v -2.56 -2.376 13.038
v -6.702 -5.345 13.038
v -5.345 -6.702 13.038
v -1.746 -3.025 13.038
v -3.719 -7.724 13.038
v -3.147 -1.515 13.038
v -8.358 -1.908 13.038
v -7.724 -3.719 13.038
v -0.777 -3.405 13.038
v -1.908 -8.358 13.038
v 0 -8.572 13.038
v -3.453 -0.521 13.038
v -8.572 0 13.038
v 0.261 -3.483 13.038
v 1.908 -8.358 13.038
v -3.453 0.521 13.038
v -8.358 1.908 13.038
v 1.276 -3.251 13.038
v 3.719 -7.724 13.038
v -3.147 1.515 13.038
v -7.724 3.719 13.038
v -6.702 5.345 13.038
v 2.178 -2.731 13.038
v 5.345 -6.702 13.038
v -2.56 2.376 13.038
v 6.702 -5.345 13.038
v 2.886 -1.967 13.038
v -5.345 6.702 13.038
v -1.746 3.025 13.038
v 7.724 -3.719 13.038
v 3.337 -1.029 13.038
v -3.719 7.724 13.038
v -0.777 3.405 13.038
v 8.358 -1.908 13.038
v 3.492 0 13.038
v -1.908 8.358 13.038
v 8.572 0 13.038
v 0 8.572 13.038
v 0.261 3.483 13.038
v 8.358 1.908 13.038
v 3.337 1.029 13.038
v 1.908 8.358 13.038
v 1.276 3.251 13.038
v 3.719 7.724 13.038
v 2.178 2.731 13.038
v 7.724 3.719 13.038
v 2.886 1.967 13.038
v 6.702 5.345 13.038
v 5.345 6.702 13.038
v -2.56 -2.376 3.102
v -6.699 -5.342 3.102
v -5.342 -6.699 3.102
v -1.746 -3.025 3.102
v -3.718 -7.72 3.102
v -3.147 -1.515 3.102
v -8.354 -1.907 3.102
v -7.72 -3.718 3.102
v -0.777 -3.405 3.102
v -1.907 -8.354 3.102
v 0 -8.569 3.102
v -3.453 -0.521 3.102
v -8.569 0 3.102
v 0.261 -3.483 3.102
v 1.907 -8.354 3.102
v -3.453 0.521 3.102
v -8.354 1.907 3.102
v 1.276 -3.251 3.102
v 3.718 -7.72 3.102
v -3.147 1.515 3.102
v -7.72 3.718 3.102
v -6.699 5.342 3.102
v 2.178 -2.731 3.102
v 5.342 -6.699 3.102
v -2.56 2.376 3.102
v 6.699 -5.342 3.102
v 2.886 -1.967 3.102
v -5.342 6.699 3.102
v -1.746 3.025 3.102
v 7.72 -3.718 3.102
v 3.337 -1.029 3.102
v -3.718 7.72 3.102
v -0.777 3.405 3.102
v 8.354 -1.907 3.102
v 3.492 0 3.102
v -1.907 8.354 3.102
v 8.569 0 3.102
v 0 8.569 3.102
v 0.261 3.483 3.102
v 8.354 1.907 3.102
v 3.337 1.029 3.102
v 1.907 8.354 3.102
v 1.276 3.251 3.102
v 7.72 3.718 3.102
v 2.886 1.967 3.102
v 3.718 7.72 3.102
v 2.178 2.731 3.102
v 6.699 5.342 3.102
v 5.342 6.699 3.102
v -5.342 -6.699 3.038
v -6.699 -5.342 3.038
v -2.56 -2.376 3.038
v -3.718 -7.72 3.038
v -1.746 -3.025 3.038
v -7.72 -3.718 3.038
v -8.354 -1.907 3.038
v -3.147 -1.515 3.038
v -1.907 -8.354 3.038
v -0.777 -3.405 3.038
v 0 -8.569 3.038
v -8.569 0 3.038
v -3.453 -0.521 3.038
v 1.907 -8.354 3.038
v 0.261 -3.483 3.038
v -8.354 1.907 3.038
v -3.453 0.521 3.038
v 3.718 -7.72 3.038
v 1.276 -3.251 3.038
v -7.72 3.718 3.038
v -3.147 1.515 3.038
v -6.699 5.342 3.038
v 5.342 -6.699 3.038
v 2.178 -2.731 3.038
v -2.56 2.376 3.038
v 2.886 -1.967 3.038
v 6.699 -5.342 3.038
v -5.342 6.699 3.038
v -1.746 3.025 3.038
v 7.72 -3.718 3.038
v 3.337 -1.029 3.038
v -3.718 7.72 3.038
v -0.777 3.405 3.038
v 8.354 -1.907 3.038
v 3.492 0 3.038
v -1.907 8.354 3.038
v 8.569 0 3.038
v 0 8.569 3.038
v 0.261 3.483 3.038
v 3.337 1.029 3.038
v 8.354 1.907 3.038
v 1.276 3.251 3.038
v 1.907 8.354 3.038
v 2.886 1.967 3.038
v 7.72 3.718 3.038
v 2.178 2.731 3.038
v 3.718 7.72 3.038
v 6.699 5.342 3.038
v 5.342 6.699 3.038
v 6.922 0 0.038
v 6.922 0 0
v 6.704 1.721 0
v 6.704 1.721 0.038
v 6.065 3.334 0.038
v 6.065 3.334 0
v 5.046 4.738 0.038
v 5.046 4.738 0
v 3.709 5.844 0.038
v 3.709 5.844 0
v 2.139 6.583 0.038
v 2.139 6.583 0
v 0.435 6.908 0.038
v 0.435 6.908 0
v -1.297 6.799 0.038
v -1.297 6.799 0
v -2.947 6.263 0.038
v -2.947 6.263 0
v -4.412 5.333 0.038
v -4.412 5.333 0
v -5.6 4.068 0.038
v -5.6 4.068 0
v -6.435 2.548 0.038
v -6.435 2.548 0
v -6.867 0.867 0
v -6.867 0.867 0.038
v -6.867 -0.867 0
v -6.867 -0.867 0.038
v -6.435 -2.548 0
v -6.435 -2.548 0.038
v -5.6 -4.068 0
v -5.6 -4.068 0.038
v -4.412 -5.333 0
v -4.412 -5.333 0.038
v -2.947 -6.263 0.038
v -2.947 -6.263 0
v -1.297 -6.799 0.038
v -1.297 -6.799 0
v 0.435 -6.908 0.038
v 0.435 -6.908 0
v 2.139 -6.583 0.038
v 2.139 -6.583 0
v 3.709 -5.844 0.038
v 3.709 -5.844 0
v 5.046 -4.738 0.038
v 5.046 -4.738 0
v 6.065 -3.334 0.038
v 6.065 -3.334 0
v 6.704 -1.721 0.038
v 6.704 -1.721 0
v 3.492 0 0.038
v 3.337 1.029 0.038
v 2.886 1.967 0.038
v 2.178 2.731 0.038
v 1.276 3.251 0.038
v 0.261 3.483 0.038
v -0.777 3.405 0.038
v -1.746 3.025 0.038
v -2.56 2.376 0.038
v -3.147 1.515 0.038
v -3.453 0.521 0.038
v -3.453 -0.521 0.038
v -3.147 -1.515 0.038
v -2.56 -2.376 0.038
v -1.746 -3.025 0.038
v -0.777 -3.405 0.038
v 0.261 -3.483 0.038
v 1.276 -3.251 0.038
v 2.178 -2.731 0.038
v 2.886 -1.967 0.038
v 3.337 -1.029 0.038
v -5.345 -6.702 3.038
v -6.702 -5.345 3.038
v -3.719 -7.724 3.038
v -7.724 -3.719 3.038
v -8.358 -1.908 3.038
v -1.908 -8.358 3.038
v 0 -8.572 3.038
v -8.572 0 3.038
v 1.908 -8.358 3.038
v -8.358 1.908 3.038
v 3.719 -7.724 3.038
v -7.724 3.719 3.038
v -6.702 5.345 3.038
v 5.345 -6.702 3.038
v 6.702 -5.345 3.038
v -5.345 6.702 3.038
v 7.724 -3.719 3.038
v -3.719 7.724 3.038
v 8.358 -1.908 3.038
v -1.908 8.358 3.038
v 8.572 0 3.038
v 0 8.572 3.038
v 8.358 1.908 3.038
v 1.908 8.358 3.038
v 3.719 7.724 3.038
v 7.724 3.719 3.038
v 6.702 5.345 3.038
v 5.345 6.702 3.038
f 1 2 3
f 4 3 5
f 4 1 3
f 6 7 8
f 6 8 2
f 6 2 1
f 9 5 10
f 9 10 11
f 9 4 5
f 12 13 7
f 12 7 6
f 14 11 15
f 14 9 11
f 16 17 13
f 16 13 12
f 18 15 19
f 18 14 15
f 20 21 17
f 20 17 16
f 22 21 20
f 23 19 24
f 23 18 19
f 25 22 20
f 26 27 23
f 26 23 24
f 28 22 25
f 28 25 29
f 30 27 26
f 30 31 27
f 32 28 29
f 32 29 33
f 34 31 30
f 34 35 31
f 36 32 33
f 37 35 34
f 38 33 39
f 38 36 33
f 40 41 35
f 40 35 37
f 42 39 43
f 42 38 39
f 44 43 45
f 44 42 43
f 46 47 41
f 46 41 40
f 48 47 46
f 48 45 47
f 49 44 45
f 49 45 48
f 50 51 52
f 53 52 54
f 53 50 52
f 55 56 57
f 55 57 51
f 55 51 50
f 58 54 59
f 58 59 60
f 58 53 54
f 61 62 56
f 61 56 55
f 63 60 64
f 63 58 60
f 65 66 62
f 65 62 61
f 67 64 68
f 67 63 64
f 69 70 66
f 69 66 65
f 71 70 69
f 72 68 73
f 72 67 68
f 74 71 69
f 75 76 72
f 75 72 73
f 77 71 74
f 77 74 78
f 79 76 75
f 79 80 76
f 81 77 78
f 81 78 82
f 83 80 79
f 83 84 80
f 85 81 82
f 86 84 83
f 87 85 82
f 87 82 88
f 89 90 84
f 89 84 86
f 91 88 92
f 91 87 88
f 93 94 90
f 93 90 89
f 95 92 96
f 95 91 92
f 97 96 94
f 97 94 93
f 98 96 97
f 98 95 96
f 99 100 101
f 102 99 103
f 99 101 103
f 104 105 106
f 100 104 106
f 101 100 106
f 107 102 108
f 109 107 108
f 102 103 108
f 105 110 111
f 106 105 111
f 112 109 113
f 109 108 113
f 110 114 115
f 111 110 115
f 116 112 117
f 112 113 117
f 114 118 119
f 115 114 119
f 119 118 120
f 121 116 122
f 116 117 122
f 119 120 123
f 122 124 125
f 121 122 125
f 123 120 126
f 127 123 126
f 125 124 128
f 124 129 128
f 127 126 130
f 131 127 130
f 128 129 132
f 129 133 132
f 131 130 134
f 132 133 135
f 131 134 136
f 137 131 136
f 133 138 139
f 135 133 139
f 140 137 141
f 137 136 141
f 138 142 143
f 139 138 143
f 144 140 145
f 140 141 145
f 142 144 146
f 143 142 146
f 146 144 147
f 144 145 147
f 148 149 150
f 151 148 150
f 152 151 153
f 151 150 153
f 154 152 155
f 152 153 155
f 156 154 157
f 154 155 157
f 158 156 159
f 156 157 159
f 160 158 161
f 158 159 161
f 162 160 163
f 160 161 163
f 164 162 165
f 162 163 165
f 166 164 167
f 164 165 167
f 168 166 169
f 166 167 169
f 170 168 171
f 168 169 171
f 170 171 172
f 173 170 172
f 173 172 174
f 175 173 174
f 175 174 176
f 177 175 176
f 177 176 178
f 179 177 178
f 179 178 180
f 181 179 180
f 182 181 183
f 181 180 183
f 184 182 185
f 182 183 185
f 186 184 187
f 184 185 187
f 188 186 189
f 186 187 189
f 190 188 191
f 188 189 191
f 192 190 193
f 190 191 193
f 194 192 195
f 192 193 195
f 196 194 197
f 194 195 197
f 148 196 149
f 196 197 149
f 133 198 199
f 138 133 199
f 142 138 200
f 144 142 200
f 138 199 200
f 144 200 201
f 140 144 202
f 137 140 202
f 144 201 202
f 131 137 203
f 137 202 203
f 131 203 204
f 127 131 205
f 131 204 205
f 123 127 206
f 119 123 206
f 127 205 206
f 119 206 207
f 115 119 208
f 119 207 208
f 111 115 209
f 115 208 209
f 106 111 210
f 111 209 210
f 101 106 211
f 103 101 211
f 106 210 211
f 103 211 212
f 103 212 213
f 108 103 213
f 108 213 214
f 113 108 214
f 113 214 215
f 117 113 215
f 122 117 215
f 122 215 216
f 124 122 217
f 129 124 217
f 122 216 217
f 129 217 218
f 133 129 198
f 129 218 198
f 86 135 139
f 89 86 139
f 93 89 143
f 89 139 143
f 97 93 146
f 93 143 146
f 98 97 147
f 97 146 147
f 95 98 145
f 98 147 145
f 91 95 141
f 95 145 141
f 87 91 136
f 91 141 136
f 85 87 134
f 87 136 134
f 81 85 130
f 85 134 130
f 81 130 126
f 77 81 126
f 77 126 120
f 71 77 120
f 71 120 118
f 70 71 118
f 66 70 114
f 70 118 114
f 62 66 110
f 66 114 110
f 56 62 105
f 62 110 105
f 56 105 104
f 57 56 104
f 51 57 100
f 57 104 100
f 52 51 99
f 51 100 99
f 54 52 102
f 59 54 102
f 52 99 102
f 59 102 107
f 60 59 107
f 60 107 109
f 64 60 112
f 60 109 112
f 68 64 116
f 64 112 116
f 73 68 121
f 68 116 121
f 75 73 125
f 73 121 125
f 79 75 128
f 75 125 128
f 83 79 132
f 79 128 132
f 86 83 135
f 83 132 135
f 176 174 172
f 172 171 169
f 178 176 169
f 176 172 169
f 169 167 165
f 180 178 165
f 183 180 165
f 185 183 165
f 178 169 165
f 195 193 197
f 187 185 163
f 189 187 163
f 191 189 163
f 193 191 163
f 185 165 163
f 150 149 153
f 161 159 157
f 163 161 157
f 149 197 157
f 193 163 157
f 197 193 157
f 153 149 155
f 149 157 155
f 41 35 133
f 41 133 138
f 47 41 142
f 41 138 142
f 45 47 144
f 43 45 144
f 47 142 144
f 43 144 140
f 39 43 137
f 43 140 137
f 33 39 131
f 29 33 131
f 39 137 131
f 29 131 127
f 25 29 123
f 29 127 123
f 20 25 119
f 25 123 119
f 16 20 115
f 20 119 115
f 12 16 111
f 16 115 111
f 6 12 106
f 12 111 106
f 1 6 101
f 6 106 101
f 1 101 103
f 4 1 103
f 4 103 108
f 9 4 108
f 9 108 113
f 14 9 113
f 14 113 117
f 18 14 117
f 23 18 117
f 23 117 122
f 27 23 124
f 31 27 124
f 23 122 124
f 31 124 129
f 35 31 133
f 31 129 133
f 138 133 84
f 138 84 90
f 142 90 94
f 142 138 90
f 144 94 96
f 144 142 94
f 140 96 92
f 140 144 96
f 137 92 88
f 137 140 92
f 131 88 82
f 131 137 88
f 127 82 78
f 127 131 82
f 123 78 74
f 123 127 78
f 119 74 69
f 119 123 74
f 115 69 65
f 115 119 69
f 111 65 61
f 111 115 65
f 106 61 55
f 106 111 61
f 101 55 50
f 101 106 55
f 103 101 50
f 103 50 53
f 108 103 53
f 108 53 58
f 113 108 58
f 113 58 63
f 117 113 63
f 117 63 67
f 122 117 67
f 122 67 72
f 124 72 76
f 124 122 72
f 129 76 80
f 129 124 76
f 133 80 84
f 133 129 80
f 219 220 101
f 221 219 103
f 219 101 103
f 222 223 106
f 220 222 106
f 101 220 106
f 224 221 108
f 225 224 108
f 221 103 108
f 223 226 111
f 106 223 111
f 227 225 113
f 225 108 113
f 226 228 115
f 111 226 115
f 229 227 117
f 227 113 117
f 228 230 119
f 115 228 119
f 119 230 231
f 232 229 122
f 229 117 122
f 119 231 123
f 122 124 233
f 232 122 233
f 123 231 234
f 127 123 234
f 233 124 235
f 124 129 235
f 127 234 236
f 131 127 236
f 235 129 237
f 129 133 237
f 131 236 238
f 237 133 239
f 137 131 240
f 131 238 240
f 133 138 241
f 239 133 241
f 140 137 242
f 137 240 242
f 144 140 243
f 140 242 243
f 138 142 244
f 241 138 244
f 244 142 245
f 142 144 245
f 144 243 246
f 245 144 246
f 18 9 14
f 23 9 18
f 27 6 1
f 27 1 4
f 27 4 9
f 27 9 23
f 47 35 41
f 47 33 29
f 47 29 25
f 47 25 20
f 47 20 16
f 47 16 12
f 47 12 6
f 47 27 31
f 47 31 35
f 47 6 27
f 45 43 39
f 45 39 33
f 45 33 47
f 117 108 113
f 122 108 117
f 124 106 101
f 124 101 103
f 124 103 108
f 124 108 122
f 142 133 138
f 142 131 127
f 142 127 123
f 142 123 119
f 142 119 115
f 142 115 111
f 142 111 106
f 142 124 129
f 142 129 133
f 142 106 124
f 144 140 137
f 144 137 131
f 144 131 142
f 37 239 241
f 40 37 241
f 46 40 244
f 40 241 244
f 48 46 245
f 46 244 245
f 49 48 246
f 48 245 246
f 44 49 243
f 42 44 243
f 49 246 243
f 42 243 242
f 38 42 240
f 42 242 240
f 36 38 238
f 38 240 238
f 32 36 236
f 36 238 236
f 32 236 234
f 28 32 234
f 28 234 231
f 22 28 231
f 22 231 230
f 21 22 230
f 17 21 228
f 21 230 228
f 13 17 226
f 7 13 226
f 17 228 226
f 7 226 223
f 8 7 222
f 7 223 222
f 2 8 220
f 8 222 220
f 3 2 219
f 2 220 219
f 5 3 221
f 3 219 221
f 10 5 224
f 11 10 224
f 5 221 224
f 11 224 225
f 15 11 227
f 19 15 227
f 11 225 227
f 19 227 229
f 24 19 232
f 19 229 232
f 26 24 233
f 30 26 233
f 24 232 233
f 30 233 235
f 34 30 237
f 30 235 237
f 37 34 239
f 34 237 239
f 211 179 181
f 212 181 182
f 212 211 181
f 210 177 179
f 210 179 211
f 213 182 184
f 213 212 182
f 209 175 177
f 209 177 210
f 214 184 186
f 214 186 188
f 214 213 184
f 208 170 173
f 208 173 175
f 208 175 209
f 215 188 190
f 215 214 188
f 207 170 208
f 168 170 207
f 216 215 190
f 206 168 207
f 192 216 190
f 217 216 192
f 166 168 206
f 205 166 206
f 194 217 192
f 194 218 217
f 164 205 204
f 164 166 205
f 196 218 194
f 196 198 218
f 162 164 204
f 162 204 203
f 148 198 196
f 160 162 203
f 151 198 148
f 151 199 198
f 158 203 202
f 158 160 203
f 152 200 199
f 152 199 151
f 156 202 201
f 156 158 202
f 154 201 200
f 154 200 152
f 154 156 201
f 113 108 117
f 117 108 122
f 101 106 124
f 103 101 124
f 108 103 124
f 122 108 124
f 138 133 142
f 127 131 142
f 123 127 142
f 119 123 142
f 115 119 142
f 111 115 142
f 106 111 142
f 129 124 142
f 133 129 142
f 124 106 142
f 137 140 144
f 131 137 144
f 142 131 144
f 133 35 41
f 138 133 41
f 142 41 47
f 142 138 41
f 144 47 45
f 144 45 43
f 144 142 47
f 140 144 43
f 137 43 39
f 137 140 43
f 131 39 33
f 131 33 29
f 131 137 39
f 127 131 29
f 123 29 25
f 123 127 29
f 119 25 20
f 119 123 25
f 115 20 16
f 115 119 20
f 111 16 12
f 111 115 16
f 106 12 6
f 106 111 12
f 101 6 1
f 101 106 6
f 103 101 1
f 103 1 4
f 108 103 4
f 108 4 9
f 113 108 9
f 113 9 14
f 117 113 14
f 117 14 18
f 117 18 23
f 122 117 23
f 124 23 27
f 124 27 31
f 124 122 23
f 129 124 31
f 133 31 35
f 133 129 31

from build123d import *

# Parameters (mm, degrees)
F0_R     = 6.9215
F1_DEPTH = 0.0381
F2_R     = 3.4925
F3_DEPTH = 2.999994
F4_R     = 8.5725
F4_R_2   = 3.4925
F5_DEPTH = 9.99998
F7_R     = 8.5686035001
F7_R_2   = 3.4925
F8_DEPTH = 0.0635
F6_R     = 3.4925
F9_DEPTH = 9.99998


with BuildPart() as f1:
    # F0 (on Top) → F1 (new body)
    with BuildSketch(Plane.XY):
        Circle(F0_R)
    extrude(amount=F1_DEPTH)

    # F2 (on face) → F3 (join)
    with BuildSketch(Plane.XY.offset(0.0381)):
        Circle(F2_R)
    extrude(amount=F3_DEPTH)


with BuildPart() as f5:
    # F4 (on face) → F5 (new body)
    with BuildSketch(Plane.XY.offset(3.038094)):
        Circle(F4_R)
        Circle(F4_R_2, mode=Mode.SUBTRACT)
    extrude(amount=F5_DEPTH)


with BuildPart() as f8:
    # F7 (on face) → F8 (new body)
    with BuildSketch(Plane.XY.offset(3.038094)):
        Circle(F7_R)
        Circle(F7_R_2, mode=Mode.SUBTRACT)
    extrude(amount=F8_DEPTH)


with BuildPart() as f9:
    # F6 (on face) → F9 (new body)
    with BuildSketch(Plane.XY.offset(3.038094)):
        Circle(F6_R)
    extrude(amount=F9_DEPTH)


solid = Compound([f1.part, f5.part, f8.part, f9.part])
